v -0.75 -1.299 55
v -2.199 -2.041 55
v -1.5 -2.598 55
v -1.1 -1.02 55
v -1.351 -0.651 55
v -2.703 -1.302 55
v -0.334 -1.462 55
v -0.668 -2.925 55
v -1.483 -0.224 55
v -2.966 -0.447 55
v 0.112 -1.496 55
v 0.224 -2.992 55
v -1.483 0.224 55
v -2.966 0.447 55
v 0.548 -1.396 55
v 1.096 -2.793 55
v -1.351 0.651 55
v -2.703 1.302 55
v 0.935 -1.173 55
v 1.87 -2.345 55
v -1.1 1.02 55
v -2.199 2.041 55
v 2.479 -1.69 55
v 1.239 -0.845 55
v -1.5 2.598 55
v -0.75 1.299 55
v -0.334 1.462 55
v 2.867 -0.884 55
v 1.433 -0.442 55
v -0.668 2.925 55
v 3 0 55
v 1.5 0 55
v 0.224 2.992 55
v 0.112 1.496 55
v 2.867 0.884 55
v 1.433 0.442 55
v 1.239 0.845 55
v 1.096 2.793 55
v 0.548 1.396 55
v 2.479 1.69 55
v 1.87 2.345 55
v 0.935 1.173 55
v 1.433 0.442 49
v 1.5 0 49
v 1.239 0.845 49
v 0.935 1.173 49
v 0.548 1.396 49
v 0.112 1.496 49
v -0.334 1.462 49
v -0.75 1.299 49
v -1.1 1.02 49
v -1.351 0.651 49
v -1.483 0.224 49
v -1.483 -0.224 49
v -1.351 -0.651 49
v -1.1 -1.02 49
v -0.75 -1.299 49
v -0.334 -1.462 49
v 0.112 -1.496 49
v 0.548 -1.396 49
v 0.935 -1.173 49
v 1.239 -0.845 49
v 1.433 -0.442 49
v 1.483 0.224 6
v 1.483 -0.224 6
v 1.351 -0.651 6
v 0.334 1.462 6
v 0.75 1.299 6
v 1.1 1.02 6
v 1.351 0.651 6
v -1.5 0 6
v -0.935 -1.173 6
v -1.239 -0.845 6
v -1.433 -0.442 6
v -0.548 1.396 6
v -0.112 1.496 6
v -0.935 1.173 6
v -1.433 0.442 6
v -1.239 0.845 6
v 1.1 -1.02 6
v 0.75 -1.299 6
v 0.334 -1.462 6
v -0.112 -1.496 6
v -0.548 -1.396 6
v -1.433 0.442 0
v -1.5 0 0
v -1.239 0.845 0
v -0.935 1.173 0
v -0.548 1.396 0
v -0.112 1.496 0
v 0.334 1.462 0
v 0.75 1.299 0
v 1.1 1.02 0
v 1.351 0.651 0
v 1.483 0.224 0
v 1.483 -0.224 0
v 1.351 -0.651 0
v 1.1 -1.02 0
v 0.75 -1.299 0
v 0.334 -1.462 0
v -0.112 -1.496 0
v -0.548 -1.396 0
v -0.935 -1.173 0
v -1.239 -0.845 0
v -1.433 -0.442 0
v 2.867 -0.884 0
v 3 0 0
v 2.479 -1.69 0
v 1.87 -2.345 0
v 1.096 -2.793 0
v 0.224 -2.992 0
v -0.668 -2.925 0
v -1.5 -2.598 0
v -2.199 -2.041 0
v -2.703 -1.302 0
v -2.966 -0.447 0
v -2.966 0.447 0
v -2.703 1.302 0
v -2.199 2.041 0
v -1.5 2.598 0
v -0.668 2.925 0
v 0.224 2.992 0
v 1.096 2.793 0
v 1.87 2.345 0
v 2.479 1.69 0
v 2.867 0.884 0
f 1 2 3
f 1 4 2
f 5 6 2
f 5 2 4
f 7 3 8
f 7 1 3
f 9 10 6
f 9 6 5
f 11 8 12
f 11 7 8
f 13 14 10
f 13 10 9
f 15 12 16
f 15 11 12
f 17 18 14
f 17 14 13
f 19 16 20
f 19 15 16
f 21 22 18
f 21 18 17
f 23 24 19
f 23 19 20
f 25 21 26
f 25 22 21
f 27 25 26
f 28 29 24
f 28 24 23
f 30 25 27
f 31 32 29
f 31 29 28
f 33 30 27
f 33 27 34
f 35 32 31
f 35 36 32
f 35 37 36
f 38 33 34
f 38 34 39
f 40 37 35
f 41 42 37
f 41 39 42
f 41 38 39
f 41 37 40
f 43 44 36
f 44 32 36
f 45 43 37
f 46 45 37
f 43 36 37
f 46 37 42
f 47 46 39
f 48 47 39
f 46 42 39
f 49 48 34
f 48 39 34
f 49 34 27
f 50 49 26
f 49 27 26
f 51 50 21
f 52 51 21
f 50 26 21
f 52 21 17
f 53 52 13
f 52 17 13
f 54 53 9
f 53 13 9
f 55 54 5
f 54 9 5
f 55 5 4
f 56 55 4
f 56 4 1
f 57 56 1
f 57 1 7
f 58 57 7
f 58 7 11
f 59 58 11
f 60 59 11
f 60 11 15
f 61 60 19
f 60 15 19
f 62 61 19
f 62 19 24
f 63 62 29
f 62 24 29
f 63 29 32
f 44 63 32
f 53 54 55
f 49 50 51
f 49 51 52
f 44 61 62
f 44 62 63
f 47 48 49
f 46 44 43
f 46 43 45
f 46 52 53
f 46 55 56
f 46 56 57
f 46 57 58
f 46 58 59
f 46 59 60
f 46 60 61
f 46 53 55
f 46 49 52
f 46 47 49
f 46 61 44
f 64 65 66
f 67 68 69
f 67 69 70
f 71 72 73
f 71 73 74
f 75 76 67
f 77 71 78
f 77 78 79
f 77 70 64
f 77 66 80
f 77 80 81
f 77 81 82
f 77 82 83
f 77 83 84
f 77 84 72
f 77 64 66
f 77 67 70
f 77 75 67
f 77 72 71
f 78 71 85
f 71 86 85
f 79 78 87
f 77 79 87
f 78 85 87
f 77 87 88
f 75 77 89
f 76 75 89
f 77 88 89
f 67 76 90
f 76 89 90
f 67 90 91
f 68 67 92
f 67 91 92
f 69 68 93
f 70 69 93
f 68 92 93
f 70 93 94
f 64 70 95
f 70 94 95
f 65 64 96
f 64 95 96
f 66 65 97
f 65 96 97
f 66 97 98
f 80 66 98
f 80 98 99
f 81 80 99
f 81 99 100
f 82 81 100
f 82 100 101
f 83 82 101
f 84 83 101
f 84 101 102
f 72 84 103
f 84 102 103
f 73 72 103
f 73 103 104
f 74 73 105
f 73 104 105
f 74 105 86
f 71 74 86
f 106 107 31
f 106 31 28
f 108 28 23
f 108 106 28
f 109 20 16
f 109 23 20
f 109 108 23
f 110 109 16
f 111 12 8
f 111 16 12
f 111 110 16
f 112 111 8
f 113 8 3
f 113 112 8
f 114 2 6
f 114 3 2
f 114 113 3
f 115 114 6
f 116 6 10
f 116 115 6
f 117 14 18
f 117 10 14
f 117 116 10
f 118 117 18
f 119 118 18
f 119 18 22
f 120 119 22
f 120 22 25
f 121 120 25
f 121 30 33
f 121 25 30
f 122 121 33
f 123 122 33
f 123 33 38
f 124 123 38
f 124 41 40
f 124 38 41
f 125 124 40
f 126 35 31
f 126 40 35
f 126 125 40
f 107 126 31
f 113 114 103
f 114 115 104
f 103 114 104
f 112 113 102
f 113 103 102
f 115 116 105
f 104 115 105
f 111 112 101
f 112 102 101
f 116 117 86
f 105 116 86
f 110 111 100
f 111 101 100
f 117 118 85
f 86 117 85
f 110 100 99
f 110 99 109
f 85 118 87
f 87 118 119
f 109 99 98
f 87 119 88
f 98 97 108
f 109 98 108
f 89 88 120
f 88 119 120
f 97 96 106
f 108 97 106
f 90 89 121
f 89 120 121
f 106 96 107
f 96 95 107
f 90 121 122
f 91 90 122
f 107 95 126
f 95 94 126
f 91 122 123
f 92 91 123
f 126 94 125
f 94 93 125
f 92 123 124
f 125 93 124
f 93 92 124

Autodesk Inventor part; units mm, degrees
ref_plane "YZ Plane" through (0, 0, 0) normal (1, 0, 0) x (0, 1, 0)
ref_plane "XZ Plane" through (0, 0, 0) normal (0, 1, 0) x (-1, 0, 0)
ref_plane "XY Plane" through (0, 0, 0) normal (0, 0, 1) x (1, 0, 0)
sketch "スケッチ1" plane through (0, 0, 0) normal (0, 0, 1) x (1, 0, 0)
  circle A0 centre (0, 0) radius 3
  dimension "d0" = 6
extrude "押し出し1" add sketch "スケッチ1" along normal blind 55
sketch "スケッチ2" plane through (0, 0, 55) normal (0, 0, 1) x (1, 0, 0)
  circle A0 centre (0, 0) radius 1.5
  dimension "d3" = 3
extrude "押し出し2" cut sketch "スケッチ2" against normal blind 6
sketch "スケッチ3" plane through (0, 0, 0) normal (0, 0, -1) x (-1, 0, 0)
  circle A0 centre (0, 0) radius 1.5 projected
  circle A1 centre (0, 0) radius 1.5
  dimension "d6" = 3
extrude "押し出し3" cut sketch "スケッチ3" against normal blind 6
properties part number "スペーサーm3-55" material "アルミニウム 2014-T4"
